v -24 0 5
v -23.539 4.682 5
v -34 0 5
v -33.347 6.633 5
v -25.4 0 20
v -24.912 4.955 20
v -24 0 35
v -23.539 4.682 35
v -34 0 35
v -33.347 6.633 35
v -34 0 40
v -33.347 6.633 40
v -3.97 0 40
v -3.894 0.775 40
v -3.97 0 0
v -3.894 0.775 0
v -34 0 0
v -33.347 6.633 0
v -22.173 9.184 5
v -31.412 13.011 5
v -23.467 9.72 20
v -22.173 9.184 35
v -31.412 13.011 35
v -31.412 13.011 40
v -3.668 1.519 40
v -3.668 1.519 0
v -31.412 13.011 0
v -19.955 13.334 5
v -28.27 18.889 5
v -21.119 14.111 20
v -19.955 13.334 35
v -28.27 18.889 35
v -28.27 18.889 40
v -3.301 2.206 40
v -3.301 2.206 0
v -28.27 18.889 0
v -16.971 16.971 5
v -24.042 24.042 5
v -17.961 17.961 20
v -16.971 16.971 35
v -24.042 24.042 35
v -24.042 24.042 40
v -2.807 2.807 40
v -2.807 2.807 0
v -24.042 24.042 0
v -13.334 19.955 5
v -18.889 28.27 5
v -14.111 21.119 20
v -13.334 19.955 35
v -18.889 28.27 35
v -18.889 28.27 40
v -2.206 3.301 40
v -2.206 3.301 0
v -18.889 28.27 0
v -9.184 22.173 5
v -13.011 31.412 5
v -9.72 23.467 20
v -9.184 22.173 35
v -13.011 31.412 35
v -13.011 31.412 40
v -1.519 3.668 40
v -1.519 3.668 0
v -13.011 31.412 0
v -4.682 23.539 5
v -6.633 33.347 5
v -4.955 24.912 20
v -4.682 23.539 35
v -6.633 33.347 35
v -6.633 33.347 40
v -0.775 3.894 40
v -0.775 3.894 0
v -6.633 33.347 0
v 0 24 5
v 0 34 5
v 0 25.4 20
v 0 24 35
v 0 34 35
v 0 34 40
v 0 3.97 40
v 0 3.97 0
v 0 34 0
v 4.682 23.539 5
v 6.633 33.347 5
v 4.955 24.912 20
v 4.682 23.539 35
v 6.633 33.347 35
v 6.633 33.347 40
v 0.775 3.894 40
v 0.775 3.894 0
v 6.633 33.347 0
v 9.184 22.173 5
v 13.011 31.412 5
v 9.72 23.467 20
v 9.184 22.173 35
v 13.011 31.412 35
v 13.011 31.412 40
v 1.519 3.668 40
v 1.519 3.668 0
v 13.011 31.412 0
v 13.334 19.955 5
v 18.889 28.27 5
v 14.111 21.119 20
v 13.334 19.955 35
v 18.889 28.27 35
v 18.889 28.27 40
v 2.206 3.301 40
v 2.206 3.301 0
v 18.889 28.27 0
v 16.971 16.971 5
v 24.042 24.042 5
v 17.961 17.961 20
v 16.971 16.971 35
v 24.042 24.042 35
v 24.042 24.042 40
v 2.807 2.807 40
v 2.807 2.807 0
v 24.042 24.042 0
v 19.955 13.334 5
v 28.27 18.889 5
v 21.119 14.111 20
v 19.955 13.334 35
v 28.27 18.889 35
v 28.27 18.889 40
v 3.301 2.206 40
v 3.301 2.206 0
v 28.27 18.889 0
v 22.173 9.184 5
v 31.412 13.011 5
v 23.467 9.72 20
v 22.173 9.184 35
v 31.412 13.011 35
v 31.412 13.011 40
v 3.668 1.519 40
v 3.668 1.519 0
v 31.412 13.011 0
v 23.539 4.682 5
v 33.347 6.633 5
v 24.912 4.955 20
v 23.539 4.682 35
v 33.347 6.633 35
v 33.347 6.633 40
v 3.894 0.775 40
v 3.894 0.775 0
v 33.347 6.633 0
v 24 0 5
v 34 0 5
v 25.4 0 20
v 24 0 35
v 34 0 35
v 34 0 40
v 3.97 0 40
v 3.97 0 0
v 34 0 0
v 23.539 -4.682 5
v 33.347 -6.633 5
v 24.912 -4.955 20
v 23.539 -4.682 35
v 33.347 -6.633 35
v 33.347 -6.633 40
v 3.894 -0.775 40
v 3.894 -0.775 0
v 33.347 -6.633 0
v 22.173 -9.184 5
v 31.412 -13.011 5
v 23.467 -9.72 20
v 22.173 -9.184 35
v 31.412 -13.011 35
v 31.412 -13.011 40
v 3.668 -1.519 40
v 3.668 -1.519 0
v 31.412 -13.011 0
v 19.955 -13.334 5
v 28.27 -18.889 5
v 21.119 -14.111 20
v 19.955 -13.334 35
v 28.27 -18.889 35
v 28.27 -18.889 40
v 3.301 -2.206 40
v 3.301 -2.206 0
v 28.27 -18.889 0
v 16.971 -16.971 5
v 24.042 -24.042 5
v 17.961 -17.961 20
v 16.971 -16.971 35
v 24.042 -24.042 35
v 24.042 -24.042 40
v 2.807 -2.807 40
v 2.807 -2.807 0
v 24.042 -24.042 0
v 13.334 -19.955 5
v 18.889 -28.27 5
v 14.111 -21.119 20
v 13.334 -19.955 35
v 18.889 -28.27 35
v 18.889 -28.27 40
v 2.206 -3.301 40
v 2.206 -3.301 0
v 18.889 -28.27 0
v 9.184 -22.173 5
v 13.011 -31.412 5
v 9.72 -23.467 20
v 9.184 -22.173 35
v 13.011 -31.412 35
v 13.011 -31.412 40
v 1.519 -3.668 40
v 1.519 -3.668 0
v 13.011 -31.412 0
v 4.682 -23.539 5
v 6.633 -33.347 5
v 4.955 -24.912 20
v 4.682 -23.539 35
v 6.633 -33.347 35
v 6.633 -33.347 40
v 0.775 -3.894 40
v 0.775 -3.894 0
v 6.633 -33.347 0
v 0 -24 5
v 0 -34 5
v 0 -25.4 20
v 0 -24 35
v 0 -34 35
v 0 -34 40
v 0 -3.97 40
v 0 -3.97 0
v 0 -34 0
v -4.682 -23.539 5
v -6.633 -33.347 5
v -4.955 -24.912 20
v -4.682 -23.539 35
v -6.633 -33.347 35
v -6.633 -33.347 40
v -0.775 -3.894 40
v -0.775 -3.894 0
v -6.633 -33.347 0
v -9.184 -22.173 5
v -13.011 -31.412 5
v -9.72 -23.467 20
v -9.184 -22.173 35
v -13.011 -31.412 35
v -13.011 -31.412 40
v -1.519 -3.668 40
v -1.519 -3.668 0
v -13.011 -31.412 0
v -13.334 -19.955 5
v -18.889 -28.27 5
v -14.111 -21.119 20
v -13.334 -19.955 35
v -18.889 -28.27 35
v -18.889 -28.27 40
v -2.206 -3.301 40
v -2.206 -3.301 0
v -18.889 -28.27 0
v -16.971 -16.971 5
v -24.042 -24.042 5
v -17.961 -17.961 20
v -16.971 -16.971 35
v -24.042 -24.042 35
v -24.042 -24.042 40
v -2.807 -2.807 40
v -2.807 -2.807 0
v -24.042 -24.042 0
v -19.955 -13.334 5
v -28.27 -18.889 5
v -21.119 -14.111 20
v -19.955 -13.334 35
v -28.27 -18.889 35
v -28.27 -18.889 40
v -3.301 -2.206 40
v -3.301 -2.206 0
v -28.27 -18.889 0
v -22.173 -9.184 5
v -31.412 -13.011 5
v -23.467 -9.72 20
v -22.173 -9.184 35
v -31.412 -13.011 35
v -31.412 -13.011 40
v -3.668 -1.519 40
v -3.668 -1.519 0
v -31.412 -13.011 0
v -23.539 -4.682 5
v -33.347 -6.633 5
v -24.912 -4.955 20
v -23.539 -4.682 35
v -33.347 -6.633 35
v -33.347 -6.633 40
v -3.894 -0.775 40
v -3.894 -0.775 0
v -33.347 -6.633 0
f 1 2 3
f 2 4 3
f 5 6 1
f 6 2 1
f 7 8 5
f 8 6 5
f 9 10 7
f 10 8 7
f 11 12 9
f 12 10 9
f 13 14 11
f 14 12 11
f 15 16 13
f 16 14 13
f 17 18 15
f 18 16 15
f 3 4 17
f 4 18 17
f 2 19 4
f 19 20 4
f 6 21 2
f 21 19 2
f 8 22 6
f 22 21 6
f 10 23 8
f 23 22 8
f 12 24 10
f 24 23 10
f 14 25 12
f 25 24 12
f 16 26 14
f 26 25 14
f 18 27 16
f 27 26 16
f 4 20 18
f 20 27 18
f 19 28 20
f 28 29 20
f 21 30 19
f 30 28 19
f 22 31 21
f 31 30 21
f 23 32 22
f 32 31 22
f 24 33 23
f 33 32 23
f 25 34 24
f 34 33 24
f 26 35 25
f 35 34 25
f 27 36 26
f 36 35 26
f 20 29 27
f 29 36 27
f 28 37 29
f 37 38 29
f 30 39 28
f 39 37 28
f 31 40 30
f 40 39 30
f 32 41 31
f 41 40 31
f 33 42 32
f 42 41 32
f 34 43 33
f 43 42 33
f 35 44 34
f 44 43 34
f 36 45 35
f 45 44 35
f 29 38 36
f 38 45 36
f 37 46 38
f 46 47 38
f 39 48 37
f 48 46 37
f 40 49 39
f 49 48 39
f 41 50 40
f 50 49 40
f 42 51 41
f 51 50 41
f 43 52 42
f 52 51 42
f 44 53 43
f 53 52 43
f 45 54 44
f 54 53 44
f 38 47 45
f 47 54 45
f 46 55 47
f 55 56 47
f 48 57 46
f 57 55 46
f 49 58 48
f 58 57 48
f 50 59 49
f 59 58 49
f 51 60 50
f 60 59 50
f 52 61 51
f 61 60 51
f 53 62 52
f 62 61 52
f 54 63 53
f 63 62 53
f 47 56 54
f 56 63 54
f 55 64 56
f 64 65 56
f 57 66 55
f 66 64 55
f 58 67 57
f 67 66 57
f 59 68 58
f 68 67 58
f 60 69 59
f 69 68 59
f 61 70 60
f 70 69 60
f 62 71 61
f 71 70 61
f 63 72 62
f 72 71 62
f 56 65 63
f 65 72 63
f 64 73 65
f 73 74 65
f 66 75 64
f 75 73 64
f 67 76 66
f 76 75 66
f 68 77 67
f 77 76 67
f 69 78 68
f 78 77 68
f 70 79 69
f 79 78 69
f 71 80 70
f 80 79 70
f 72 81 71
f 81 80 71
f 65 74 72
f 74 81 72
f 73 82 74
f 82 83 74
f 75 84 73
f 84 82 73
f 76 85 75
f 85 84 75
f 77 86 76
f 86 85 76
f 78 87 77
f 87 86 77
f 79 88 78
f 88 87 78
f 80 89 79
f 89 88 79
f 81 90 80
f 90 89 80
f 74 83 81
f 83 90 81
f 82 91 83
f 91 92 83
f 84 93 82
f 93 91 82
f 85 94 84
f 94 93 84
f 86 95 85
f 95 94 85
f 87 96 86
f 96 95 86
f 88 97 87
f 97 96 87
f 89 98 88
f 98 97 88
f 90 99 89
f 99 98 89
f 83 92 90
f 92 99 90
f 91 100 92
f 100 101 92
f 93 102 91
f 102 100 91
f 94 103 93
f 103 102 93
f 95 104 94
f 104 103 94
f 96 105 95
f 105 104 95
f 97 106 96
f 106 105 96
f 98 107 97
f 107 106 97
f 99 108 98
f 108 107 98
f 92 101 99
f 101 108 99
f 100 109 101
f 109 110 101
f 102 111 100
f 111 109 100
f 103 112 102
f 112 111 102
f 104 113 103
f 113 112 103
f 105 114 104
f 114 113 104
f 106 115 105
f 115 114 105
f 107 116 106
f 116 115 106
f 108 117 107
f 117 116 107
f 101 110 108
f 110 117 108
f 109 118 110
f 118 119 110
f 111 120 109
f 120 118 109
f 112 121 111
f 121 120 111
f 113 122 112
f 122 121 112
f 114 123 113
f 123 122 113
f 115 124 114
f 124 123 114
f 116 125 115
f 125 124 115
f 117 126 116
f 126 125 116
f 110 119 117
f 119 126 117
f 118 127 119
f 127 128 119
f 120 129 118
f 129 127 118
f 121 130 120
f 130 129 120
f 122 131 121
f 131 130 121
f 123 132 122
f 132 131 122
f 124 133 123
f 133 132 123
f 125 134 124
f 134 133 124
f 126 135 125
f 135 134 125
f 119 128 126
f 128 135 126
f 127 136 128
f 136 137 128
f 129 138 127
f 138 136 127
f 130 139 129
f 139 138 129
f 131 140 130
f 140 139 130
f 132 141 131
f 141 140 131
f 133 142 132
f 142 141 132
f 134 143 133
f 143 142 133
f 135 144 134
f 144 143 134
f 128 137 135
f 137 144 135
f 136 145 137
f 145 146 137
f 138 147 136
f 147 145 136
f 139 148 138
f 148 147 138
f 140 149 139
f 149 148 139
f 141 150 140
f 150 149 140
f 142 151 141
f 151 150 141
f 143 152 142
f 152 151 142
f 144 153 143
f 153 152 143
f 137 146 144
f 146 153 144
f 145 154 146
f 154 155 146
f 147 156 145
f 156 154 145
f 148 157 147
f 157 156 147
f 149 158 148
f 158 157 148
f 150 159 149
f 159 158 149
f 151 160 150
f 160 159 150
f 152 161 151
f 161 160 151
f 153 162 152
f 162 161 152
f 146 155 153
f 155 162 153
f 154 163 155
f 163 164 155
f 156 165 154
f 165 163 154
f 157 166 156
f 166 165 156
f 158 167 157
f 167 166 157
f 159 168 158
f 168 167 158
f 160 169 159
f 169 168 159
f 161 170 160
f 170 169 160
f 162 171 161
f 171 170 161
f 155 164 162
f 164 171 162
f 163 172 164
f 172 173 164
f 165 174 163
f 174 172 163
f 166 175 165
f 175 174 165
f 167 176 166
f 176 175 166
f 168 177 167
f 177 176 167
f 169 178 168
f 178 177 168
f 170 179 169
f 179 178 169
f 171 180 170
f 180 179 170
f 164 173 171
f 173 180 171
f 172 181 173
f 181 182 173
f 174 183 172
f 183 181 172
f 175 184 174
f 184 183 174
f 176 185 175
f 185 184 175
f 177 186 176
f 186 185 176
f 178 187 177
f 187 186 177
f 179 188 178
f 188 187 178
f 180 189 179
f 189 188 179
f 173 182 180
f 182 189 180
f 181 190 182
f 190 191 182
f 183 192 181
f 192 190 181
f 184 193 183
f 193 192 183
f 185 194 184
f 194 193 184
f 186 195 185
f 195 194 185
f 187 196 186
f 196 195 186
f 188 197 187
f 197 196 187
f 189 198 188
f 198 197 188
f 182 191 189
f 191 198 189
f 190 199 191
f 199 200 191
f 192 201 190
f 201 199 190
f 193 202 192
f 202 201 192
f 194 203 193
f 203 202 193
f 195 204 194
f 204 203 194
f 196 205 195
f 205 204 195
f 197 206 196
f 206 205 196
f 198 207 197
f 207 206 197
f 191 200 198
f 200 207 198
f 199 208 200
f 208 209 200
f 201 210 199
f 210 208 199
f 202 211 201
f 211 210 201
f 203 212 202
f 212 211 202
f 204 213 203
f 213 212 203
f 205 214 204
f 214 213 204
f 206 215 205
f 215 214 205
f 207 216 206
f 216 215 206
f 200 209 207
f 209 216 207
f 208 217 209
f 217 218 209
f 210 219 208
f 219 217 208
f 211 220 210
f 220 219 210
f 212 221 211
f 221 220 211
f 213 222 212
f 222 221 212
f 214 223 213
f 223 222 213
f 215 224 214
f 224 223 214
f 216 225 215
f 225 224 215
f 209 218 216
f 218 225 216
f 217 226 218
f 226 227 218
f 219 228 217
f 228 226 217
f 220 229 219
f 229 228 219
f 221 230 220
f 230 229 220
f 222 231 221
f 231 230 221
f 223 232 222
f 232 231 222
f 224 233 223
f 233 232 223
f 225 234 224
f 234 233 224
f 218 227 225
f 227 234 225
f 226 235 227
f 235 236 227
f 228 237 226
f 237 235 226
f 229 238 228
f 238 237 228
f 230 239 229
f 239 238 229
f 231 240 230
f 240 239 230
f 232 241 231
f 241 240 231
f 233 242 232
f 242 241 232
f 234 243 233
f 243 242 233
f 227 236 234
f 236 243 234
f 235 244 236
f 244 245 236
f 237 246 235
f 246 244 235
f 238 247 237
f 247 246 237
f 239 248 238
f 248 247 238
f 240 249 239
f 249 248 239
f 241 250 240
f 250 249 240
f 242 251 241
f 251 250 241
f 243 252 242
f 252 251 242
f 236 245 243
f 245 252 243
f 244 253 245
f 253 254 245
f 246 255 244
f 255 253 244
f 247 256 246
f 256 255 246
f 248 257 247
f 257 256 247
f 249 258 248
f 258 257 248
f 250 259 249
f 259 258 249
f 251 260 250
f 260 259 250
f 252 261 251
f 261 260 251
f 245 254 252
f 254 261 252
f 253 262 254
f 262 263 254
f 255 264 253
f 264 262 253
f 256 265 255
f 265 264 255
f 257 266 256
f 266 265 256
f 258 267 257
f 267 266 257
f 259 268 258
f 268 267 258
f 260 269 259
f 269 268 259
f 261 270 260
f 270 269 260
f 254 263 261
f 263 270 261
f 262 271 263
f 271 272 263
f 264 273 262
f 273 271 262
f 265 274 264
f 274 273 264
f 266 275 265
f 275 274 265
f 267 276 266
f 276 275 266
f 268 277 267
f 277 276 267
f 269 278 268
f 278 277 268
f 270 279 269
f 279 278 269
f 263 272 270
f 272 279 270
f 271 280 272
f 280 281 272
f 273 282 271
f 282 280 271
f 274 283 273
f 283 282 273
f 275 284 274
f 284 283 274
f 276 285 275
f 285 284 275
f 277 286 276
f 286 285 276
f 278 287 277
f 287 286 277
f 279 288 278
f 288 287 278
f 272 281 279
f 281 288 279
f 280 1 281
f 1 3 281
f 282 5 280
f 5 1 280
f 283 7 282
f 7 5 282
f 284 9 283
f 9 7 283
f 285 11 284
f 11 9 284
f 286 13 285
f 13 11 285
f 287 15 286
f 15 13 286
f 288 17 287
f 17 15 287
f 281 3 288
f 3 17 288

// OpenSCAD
$fn = 32;

// ----------------------------------------------------------------------
// Belt roller: 48 mm barrel, 40 mm wide, bore 7.94 mm
// ----------------------------------------------------------------------

// --- parameters (mm) ---
bore_d = 7.94;            // bore
barrel_d = 48;            // barrel diameter
roller_w = 40;            // roller width
flange_d = 68;            // flange diameter
flange_t = 5;             // flange thickness
hub_d = 27.94;            // hub diameter

roller_profile = [[3.97, 0], [34, 0], [34, 5], [24, 5], [25.4, 20], [24, 35], [34, 35], [34, 40], [3.97, 40]];

/* the profile stays clear of the axis, so the bore comes out of the revolve */
rotate_extrude() polygon(roller_profile);
